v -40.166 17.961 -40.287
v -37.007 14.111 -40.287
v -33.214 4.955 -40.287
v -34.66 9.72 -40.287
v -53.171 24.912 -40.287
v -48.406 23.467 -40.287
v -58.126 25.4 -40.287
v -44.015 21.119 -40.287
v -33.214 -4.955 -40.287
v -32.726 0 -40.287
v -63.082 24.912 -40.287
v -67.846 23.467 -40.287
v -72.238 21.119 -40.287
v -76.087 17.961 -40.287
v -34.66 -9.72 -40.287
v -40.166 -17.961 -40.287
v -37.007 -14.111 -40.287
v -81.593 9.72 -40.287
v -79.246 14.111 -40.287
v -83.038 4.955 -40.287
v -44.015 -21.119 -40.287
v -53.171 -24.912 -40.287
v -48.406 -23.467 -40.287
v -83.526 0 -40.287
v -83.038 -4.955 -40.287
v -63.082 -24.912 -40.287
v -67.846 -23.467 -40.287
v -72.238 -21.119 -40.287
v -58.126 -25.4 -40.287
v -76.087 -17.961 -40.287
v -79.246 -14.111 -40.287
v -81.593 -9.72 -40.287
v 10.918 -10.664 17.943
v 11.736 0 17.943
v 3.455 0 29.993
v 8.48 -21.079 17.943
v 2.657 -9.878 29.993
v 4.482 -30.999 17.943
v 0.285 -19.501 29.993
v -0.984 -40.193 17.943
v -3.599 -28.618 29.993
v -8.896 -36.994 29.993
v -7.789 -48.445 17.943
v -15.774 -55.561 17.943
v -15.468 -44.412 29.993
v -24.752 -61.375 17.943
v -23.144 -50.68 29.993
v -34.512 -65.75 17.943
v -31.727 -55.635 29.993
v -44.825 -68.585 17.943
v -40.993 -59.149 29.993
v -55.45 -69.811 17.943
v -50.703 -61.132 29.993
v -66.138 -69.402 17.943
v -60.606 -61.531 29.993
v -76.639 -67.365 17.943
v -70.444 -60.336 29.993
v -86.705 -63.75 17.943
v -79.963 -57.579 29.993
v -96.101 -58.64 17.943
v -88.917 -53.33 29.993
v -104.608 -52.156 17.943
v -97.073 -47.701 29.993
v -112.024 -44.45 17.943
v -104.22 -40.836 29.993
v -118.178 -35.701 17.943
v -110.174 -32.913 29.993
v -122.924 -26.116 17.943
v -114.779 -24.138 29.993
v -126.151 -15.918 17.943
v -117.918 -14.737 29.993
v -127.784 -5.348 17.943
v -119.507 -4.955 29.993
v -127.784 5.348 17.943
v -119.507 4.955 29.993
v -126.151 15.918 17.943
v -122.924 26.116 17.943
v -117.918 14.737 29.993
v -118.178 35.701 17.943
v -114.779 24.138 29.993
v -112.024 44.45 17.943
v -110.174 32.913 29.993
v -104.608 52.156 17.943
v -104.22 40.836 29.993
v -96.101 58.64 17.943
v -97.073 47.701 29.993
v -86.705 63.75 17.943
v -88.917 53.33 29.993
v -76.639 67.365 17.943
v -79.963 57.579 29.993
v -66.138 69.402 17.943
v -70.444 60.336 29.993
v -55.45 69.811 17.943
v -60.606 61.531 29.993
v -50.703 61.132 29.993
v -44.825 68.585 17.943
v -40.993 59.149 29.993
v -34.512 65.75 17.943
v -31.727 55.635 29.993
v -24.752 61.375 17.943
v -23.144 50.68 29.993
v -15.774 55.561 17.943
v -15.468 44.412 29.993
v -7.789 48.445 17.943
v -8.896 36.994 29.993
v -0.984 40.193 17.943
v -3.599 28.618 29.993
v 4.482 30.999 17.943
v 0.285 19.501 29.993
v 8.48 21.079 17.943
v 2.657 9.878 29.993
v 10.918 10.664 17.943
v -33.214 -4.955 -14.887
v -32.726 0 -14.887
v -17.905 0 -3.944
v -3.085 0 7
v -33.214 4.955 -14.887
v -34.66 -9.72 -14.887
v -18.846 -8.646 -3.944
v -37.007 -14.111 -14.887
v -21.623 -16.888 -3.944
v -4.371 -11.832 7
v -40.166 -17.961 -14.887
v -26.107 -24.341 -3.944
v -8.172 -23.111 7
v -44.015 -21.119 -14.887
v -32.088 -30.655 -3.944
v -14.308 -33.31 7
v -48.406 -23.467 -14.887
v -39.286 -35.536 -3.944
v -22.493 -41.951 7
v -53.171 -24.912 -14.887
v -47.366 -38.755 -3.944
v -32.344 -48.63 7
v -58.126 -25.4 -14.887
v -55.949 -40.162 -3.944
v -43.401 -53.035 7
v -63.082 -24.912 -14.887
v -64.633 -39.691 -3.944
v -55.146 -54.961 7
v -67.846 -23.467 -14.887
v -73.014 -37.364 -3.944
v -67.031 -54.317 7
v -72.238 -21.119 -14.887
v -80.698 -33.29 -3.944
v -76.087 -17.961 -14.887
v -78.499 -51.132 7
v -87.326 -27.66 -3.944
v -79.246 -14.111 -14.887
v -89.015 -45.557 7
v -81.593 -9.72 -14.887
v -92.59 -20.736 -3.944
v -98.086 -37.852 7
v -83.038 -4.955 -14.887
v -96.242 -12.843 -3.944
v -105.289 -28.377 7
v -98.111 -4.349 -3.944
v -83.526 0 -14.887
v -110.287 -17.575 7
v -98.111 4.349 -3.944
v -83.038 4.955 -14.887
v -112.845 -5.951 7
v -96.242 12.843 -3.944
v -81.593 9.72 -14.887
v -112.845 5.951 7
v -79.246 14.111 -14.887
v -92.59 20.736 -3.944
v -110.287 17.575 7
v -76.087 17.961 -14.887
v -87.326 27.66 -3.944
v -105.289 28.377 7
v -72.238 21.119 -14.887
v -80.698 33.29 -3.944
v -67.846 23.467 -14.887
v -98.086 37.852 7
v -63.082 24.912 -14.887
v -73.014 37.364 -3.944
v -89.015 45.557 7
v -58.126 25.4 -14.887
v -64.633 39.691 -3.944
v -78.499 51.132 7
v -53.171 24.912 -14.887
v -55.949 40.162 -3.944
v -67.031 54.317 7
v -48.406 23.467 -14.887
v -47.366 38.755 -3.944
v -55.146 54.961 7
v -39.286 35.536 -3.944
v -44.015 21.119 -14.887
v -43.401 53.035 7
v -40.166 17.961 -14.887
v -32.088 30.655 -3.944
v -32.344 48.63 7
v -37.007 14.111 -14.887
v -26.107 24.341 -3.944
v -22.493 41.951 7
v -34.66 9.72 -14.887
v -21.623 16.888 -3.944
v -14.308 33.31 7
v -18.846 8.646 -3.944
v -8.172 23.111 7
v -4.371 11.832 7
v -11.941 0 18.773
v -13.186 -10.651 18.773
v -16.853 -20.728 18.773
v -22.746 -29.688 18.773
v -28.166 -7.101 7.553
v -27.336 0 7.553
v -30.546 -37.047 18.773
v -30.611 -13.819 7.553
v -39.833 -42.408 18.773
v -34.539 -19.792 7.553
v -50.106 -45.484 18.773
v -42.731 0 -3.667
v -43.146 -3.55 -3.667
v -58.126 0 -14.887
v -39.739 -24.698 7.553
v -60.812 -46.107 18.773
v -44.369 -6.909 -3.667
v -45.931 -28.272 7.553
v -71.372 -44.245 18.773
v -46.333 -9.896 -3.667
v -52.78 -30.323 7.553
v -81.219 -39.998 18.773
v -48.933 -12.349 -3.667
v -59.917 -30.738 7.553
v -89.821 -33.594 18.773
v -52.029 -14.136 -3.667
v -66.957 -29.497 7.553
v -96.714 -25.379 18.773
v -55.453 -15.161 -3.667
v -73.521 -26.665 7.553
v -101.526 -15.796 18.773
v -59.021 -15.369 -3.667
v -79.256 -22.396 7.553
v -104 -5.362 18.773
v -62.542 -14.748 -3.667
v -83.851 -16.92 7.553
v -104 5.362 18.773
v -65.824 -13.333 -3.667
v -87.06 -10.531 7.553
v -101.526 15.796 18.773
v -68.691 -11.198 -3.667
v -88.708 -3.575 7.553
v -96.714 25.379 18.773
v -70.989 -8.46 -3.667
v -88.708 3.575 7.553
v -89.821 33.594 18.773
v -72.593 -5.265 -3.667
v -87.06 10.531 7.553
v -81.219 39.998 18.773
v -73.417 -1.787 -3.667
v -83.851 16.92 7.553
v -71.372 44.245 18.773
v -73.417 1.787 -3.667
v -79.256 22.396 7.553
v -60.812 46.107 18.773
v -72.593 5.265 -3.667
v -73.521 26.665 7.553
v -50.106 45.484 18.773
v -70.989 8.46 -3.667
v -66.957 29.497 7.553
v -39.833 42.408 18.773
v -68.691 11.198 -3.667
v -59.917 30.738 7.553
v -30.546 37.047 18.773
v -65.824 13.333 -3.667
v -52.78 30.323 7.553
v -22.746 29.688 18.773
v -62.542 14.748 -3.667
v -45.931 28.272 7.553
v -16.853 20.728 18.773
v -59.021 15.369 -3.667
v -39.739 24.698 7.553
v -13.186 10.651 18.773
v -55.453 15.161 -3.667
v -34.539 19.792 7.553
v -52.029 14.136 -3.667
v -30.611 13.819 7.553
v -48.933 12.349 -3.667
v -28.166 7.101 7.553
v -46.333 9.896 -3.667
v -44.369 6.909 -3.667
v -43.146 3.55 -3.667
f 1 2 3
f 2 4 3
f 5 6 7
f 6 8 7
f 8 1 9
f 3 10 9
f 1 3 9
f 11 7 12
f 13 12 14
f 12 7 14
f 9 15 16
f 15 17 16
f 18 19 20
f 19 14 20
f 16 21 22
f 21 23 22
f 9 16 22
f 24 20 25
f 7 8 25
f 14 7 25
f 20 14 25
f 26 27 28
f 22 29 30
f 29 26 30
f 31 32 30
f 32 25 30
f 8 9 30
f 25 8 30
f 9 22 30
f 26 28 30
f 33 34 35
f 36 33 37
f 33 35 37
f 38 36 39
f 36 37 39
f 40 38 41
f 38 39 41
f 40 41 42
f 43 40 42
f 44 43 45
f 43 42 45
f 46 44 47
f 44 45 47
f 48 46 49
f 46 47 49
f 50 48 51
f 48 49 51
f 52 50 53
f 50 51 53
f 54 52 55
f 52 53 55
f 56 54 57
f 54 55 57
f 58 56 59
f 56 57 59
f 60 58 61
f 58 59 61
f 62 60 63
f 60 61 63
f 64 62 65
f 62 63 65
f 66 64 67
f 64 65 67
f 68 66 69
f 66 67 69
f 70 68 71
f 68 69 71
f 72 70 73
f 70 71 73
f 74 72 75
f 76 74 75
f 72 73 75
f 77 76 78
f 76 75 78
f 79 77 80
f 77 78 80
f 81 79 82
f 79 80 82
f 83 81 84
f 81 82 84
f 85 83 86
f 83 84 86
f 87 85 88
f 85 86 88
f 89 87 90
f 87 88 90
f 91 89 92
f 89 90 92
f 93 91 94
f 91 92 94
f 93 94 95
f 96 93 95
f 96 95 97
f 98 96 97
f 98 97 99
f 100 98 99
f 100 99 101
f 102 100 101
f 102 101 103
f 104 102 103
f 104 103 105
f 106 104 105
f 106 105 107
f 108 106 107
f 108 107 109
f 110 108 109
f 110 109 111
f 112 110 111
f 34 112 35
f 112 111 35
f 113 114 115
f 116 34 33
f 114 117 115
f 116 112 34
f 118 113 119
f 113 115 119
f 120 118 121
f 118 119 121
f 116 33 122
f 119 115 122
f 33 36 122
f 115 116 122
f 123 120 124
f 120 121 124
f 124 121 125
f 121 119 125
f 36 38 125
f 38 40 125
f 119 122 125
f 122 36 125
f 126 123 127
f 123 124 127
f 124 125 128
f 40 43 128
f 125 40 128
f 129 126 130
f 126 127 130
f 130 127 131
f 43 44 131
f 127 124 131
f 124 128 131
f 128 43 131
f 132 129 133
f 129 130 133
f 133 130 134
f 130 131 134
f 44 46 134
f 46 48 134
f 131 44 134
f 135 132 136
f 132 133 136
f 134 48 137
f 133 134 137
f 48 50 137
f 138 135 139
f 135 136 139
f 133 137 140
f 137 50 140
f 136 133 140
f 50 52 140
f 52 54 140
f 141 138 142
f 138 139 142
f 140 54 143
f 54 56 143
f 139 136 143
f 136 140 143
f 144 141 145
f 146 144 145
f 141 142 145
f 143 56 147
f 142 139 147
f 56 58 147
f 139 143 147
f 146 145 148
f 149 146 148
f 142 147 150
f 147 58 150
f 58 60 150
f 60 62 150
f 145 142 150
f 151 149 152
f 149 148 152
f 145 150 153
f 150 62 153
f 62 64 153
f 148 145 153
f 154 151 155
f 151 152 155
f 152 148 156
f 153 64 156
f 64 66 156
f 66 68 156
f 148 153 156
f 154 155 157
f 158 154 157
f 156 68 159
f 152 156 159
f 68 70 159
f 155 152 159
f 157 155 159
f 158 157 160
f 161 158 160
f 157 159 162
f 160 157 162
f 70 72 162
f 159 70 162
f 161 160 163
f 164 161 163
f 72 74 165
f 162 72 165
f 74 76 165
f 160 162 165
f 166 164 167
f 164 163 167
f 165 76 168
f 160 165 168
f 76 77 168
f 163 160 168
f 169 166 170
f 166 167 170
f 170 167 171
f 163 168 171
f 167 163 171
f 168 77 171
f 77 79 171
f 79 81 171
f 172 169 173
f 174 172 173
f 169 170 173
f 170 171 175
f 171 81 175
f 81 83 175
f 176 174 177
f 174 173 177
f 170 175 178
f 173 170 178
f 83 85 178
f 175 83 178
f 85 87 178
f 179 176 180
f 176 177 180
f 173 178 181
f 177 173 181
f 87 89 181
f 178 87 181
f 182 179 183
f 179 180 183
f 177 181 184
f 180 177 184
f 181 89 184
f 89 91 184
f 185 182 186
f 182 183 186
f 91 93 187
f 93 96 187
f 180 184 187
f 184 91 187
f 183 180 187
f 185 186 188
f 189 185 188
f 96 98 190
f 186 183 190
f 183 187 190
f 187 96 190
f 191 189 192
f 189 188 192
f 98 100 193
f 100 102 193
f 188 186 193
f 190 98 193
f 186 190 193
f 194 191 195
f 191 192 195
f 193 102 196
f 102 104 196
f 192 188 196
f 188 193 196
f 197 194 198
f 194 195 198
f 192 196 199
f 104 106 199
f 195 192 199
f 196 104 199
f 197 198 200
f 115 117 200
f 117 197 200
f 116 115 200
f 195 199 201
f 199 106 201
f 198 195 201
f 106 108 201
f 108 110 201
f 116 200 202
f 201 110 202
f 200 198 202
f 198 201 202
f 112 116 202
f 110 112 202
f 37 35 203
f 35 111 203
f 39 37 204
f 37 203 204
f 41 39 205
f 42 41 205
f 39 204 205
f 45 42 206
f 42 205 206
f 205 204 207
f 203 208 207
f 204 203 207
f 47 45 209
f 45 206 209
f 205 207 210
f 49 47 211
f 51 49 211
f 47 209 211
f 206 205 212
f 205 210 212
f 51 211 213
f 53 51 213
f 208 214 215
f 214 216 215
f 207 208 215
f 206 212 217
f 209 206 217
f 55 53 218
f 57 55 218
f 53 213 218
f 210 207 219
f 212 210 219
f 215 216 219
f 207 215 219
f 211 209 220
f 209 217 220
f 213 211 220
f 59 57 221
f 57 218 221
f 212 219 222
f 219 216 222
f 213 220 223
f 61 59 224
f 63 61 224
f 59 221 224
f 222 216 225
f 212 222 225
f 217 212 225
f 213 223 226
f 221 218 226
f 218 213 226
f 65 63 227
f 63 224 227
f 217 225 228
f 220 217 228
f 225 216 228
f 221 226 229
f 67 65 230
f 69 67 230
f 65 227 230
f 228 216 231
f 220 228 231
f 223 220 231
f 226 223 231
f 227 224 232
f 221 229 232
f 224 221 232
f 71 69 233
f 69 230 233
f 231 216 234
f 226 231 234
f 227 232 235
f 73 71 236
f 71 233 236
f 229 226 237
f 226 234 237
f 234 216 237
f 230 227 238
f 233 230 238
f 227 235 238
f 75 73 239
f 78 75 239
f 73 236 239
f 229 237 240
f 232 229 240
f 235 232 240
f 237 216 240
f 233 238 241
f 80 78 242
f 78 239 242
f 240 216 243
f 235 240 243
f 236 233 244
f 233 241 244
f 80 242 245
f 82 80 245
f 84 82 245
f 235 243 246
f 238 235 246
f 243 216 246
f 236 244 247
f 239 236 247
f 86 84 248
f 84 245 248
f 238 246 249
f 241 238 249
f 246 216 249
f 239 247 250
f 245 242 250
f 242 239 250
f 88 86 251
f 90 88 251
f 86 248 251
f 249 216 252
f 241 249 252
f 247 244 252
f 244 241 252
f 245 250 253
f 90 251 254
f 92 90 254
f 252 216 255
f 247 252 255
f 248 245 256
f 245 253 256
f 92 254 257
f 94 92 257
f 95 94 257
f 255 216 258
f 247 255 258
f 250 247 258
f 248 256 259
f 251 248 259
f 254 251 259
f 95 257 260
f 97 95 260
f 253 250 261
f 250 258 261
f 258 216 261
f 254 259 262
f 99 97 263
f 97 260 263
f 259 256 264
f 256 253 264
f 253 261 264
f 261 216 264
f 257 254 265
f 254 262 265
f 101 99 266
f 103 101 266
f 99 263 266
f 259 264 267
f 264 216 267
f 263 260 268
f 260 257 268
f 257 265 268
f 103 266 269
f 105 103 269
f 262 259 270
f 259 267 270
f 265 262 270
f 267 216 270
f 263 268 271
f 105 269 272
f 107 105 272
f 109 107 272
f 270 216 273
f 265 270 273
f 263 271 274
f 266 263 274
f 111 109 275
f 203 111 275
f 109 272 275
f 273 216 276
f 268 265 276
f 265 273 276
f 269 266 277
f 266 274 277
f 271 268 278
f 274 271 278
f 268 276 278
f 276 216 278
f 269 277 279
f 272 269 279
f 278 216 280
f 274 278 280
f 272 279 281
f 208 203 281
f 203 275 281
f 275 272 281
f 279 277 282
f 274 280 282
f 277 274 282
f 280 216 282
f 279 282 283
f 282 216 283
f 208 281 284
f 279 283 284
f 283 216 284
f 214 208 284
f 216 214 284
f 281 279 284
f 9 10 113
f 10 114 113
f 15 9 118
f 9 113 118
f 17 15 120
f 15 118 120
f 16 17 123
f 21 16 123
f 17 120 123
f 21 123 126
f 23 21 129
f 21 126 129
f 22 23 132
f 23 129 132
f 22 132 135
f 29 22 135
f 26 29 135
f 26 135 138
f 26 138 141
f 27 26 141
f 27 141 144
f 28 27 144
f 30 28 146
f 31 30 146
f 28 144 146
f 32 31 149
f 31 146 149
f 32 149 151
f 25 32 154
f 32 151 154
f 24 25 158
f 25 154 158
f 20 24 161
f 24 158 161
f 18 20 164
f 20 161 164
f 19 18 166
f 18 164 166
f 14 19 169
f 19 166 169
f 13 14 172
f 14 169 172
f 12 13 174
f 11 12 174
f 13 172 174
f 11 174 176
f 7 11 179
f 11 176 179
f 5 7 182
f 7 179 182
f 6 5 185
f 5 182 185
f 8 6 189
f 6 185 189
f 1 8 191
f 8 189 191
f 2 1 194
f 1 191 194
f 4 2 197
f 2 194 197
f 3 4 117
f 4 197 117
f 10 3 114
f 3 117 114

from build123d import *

# Parameters (mm, degrees)
F2_R     = 25.4
F3_DEPTH = 25.4
F4_DEPTH = 76.2


with BuildPart() as f1:
    # F0 (on Front) → F1 (revolve)
    with BuildSketch(Plane.XZ):
        Polygon((-58.1262356877, -14.8871221304), (-58.1262356877, -40.2871221304), (-32.7262356877, -40.2871221304), (-32.7262356877, -14.8871221304), (11.7363044992, 17.9430041462), (3.4545188379, 29.9932819682), align=None)
    revolve(axis=Axis((-58.1262356877, 0, -27.5871221304), (0, 0, -1)))


with BuildPart() as f3:
    # F2 (on face) → F3 (new body)
    with BuildSketch(Plane(origin=(0, 0, -40.2871221304), x_dir=(1, 0, 0), z_dir=(0, 0, -1))):
        with Locations((-58.1262356877, 0)):
            Circle(F2_R)
    extrude(amount=F3_DEPTH)

    # F4 (cut): a face of the model
    f4_faces = [f3.faces().sort_by_distance(p)[0] for p in [
        (-58.1262356877, 0, -65.6871221304),
    ]]
    extrude(f4_faces, amount=-F4_DEPTH, mode=Mode.SUBTRACT)


solid = f1.part
